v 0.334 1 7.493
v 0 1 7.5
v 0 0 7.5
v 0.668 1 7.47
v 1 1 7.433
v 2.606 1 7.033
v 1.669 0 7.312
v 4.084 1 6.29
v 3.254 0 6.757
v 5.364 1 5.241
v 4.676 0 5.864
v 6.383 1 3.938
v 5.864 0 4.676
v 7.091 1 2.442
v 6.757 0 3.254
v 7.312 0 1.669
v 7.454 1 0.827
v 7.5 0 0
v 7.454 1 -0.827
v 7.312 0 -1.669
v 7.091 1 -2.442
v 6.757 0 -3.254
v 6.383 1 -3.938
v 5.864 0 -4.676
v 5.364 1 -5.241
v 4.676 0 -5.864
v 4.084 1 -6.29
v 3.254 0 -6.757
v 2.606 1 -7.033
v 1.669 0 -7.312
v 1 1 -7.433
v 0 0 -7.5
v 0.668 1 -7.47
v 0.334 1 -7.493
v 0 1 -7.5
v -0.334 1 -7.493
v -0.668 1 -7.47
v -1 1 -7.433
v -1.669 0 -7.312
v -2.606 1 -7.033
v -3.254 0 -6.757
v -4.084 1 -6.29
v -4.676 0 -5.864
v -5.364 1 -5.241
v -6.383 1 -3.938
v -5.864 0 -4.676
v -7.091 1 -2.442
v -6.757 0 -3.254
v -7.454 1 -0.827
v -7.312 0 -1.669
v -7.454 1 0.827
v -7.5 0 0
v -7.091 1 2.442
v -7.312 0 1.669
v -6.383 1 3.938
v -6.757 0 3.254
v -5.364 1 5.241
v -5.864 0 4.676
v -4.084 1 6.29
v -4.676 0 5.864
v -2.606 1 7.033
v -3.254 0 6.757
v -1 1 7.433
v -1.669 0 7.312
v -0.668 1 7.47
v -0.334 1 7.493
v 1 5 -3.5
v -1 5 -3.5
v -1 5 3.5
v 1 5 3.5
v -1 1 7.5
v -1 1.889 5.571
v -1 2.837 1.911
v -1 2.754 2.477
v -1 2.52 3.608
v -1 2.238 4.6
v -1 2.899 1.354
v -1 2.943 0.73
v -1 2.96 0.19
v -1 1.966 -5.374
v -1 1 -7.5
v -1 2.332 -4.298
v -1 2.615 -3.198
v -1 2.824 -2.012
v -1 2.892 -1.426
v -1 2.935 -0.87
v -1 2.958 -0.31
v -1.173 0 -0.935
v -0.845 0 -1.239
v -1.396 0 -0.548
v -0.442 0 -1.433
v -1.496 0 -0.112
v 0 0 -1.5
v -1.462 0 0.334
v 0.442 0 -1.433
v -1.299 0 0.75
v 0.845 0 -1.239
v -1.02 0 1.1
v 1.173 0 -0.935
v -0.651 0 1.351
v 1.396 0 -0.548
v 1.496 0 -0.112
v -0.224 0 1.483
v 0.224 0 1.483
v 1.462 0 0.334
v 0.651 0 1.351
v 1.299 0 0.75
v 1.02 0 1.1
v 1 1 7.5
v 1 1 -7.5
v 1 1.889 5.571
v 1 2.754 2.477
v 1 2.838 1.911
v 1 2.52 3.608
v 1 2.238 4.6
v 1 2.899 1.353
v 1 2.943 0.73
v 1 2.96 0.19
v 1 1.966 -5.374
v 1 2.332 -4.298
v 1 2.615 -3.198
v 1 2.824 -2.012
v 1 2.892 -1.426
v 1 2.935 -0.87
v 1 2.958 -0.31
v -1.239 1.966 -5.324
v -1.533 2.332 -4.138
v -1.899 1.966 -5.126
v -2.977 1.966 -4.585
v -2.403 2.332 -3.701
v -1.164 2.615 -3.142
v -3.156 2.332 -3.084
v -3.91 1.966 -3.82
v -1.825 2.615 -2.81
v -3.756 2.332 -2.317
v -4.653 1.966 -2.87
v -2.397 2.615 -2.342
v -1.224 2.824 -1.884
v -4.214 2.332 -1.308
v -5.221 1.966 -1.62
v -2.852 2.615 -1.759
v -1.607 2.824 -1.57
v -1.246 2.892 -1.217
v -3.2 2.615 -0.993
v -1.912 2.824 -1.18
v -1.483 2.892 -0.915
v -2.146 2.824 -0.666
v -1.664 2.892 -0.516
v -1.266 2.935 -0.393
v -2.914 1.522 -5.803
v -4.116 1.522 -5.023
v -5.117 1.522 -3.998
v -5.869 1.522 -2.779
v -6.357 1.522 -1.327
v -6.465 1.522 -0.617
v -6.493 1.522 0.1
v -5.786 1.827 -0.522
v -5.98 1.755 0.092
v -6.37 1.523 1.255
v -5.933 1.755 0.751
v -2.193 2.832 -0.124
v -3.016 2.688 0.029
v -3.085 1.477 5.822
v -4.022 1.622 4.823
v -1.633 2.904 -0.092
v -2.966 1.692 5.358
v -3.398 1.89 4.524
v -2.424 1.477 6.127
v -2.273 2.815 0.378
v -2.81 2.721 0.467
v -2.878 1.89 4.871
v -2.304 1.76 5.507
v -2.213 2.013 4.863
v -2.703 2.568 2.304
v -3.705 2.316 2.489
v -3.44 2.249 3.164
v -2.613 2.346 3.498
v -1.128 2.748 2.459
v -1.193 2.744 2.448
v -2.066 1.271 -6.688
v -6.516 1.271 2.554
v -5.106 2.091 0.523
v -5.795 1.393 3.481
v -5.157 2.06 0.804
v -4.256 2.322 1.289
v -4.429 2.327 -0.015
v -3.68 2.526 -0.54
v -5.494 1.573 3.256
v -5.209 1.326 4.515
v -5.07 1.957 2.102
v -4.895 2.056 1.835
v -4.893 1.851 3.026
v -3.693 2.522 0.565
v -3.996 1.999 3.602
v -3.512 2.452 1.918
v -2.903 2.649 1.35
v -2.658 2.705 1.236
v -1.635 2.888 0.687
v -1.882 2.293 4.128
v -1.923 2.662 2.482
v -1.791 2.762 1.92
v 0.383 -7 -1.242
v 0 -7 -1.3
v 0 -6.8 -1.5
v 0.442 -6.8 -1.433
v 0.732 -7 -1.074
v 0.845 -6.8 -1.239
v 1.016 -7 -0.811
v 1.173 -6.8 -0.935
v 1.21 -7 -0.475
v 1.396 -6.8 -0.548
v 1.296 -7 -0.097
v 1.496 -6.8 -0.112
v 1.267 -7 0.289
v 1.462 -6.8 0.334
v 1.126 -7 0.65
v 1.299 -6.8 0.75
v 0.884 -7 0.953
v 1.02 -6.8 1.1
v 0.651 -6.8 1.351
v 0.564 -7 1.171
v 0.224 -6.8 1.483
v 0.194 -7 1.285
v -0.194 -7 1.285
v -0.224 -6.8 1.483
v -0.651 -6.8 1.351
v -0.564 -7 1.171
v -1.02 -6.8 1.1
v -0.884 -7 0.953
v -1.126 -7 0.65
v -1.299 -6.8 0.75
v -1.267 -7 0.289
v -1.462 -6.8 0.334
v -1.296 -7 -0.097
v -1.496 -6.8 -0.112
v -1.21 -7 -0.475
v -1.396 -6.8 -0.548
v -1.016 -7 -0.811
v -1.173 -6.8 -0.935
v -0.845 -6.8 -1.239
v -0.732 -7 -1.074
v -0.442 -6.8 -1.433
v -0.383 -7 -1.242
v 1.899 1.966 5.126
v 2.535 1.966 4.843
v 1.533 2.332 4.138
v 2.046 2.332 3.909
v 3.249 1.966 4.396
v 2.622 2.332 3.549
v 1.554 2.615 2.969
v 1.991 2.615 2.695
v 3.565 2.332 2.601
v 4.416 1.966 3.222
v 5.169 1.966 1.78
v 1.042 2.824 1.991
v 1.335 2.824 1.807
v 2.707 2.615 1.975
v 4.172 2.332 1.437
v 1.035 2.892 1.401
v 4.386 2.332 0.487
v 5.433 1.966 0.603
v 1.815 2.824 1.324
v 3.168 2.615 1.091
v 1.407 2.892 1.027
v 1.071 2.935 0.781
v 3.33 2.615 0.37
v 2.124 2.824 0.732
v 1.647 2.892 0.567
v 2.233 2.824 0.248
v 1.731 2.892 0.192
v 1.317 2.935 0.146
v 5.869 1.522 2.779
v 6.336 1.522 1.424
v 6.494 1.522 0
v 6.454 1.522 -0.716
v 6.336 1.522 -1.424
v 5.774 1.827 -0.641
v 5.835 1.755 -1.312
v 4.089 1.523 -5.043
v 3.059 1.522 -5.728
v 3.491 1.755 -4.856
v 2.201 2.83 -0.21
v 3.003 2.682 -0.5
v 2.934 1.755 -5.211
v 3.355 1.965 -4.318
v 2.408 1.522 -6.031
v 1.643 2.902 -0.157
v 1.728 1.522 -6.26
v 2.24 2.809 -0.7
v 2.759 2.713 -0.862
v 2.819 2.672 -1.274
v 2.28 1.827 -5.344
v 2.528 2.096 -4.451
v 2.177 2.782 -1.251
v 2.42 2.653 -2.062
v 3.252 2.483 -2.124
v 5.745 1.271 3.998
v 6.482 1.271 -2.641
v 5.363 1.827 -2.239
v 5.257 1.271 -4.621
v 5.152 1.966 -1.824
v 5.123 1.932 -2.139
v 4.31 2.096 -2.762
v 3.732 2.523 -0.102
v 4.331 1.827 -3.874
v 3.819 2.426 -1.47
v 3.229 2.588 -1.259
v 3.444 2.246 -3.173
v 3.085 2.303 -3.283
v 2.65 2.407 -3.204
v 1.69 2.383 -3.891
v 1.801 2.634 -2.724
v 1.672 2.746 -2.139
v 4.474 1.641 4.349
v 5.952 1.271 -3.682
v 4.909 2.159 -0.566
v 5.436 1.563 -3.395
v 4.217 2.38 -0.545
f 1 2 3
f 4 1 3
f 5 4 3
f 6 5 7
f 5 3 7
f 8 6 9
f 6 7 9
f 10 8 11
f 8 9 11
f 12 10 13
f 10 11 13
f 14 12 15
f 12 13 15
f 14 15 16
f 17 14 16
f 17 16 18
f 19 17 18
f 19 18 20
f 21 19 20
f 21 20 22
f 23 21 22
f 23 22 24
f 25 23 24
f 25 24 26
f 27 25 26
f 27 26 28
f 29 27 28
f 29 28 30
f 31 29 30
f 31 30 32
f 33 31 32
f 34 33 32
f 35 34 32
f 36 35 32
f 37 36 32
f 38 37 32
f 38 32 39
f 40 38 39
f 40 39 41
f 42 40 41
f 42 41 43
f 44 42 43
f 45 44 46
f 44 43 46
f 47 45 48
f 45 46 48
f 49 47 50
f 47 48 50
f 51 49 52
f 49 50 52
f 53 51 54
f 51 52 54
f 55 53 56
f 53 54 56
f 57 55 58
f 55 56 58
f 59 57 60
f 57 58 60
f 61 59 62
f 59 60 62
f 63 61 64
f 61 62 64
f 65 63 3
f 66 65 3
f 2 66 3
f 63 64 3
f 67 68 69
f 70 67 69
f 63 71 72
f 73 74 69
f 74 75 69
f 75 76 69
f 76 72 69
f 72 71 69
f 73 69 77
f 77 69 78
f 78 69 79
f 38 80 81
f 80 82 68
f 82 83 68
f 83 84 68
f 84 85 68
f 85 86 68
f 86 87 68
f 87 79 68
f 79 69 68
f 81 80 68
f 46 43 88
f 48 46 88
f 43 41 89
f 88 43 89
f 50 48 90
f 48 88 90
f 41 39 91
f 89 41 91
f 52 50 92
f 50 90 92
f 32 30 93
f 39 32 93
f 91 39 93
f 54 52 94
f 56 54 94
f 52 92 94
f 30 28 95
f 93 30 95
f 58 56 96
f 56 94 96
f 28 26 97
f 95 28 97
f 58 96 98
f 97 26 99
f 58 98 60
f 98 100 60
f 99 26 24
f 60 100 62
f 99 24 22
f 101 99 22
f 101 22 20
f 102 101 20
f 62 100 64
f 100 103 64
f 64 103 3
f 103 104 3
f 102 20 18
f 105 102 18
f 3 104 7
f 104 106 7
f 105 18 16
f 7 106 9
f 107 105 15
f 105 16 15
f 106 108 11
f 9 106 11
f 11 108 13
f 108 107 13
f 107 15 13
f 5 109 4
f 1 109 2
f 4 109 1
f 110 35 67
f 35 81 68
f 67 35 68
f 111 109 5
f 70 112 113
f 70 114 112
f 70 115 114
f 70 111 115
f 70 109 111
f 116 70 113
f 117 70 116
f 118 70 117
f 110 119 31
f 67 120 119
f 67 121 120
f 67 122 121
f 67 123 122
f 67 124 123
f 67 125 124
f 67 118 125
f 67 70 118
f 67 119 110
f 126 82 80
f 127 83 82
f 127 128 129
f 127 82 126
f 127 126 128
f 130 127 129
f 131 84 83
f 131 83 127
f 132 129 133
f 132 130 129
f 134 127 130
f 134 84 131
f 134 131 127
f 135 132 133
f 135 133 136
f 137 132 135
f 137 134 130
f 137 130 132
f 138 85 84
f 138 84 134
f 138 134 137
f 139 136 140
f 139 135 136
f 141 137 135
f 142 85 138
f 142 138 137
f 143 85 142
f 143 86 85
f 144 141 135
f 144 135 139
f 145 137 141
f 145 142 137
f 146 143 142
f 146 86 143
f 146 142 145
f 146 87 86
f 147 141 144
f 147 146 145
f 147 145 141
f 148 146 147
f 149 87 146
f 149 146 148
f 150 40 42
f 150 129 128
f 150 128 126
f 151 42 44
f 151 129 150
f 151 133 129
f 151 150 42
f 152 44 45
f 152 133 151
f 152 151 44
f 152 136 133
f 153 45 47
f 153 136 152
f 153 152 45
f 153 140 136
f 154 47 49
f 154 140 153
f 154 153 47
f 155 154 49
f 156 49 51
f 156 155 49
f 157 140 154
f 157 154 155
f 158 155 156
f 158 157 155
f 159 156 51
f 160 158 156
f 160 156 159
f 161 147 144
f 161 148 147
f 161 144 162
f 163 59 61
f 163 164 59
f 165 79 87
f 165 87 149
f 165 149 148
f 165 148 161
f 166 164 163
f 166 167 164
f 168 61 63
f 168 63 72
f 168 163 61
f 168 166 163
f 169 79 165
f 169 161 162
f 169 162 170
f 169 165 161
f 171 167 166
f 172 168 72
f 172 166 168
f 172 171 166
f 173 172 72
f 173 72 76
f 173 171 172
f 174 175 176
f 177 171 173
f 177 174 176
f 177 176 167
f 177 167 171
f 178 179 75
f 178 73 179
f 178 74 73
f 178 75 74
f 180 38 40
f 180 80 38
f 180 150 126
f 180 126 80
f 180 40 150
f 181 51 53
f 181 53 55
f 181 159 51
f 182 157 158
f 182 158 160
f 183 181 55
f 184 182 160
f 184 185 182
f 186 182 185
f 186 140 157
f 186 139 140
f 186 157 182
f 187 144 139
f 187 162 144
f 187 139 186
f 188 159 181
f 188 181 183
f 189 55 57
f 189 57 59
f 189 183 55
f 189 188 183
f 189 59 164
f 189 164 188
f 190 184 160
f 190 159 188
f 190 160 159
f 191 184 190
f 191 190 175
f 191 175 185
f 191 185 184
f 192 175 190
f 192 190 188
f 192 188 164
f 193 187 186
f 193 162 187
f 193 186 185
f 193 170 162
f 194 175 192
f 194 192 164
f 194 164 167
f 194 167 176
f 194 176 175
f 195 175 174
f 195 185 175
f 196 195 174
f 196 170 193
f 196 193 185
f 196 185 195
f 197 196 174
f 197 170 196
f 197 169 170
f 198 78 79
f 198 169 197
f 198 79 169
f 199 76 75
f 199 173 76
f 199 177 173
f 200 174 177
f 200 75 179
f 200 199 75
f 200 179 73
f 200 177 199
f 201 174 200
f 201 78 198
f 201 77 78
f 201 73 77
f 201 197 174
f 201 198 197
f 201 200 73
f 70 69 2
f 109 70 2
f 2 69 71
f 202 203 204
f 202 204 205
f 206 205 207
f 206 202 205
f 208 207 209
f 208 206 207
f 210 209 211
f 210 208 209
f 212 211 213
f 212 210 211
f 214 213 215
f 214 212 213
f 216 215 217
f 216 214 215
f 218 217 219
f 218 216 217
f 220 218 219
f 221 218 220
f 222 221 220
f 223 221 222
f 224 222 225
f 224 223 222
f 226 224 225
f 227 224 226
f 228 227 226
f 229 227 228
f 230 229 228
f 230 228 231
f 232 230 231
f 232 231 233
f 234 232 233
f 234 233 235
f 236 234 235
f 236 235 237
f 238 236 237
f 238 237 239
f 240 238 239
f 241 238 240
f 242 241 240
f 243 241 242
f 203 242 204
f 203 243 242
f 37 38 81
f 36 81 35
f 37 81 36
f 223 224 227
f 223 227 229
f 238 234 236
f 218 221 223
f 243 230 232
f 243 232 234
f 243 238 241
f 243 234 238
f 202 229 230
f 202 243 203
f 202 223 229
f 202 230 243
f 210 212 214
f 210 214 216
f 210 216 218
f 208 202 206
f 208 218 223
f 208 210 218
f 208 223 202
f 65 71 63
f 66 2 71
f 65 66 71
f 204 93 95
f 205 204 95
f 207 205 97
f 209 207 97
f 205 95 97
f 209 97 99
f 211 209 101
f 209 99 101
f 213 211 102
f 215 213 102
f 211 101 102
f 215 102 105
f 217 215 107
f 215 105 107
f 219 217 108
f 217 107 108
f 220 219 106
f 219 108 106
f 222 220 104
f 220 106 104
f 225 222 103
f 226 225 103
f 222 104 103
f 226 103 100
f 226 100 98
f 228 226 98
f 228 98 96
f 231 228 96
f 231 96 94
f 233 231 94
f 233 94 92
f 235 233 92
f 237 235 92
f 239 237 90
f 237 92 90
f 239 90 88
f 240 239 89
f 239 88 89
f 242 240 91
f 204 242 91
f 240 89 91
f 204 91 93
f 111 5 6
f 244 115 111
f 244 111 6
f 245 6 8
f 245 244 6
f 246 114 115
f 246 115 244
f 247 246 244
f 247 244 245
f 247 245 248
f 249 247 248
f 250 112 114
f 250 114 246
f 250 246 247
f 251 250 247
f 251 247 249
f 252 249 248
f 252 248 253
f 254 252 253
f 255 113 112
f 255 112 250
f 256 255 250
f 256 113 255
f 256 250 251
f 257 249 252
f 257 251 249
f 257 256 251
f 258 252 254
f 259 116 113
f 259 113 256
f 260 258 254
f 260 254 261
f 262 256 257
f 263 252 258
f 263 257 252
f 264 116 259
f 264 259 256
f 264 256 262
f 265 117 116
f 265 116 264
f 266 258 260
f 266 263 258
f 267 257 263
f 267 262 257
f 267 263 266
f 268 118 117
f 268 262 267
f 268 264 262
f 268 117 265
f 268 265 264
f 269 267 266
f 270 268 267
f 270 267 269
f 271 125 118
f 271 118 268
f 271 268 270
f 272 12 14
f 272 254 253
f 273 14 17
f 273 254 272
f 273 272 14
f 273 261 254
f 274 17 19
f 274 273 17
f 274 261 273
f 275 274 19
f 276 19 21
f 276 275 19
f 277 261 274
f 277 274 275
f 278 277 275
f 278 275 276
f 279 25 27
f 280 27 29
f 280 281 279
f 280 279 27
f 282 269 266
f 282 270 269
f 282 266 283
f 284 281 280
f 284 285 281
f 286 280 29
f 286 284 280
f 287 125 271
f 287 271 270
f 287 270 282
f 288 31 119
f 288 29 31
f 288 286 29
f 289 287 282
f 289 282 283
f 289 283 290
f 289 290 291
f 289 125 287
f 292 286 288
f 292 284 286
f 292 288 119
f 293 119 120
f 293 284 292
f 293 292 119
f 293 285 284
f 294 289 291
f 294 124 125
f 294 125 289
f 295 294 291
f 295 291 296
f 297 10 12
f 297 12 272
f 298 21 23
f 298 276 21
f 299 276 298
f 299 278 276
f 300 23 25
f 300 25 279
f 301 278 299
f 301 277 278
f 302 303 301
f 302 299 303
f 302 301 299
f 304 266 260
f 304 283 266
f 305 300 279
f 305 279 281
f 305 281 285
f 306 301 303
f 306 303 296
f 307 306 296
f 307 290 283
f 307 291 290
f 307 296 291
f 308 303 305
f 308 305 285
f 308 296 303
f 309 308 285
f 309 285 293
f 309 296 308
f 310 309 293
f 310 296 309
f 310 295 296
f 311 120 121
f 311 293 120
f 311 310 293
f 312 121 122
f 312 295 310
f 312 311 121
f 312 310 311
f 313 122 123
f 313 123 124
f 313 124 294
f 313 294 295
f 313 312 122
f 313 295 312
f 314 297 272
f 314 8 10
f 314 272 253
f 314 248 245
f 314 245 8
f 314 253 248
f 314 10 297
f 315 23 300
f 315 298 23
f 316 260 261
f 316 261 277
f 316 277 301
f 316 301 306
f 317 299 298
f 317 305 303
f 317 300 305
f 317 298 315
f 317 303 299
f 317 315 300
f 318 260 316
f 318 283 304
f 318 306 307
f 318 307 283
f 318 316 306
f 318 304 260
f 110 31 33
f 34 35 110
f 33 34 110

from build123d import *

# Parameters (mm, degrees)
SKETCH1_R                = 7.5
BOSS_EXTRUDE1_DEPTH      = 1
BOSS_EXTRUDE2_DEPTH      = 1
BOSS_EXTRUDE2_DEPTH_BACK = 1
SKETCH5_R                = 1.5
BOSS_EXTRUDE3_DEPTH      = 7
CHAMFER1_SIZE            = 0.2


with BuildPart() as part:
    # Sketch1 → Boss-Extrude1 (new body)
    with BuildSketch(Plane(origin=(0, 0, 0), x_dir=(1, 0, 0), z_dir=(0, 1, 0))):
        Circle(SKETCH1_R)
    extrude(amount=BOSS_EXTRUDE1_DEPTH)

    # Sketch3 → Revolve1 (revolve)
    with BuildSketch(Plane.XY):
        with BuildLine():
            Line((0, 1), (0, 3))
            add(Edge.make_bspline(
                [(7.5, 1), (4.015025373, 2.967534518), (0, 3)],
                knots=[0, 0, 0, 1, 1, 1], degree=2))
            Line((7.5, 1), (0, 1))
        make_face()
    revolve(axis=Axis((0, 1, 0), (0, 1, 0)))

    # Sketch4 → Boss-Extrude2 (add, two sides: drawn at the far end of the back side and taken through both)
    with BuildSketch(Plane(origin=(0, 0, 0), x_dir=(0, 0, -1), z_dir=(1, 0, 0)).offset(-BOSS_EXTRUDE2_DEPTH_BACK)):
        Polygon((-7.5, 1), (-3.499989483, 1), (3.500010517, 1), (7.5, 1), (3.500010517, 5), (-3.499989483, 5), align=None)
    extrude(amount=BOSS_EXTRUDE2_DEPTH + BOSS_EXTRUDE2_DEPTH_BACK)

    # Sketch5 → Boss-Extrude3 (add)
    with BuildSketch(Plane.XZ):
        Circle(SKETCH5_R)
    extrude(amount=BOSS_EXTRUDE3_DEPTH)

    # Chamfer1
    chamfer1_edges = [part.edges().sort_by_distance(p)[0] for p in [
        (-1.5, -7, 0),
    ]]
    chamfer(chamfer1_edges, length=CHAMFER1_SIZE)


solid = part.part
